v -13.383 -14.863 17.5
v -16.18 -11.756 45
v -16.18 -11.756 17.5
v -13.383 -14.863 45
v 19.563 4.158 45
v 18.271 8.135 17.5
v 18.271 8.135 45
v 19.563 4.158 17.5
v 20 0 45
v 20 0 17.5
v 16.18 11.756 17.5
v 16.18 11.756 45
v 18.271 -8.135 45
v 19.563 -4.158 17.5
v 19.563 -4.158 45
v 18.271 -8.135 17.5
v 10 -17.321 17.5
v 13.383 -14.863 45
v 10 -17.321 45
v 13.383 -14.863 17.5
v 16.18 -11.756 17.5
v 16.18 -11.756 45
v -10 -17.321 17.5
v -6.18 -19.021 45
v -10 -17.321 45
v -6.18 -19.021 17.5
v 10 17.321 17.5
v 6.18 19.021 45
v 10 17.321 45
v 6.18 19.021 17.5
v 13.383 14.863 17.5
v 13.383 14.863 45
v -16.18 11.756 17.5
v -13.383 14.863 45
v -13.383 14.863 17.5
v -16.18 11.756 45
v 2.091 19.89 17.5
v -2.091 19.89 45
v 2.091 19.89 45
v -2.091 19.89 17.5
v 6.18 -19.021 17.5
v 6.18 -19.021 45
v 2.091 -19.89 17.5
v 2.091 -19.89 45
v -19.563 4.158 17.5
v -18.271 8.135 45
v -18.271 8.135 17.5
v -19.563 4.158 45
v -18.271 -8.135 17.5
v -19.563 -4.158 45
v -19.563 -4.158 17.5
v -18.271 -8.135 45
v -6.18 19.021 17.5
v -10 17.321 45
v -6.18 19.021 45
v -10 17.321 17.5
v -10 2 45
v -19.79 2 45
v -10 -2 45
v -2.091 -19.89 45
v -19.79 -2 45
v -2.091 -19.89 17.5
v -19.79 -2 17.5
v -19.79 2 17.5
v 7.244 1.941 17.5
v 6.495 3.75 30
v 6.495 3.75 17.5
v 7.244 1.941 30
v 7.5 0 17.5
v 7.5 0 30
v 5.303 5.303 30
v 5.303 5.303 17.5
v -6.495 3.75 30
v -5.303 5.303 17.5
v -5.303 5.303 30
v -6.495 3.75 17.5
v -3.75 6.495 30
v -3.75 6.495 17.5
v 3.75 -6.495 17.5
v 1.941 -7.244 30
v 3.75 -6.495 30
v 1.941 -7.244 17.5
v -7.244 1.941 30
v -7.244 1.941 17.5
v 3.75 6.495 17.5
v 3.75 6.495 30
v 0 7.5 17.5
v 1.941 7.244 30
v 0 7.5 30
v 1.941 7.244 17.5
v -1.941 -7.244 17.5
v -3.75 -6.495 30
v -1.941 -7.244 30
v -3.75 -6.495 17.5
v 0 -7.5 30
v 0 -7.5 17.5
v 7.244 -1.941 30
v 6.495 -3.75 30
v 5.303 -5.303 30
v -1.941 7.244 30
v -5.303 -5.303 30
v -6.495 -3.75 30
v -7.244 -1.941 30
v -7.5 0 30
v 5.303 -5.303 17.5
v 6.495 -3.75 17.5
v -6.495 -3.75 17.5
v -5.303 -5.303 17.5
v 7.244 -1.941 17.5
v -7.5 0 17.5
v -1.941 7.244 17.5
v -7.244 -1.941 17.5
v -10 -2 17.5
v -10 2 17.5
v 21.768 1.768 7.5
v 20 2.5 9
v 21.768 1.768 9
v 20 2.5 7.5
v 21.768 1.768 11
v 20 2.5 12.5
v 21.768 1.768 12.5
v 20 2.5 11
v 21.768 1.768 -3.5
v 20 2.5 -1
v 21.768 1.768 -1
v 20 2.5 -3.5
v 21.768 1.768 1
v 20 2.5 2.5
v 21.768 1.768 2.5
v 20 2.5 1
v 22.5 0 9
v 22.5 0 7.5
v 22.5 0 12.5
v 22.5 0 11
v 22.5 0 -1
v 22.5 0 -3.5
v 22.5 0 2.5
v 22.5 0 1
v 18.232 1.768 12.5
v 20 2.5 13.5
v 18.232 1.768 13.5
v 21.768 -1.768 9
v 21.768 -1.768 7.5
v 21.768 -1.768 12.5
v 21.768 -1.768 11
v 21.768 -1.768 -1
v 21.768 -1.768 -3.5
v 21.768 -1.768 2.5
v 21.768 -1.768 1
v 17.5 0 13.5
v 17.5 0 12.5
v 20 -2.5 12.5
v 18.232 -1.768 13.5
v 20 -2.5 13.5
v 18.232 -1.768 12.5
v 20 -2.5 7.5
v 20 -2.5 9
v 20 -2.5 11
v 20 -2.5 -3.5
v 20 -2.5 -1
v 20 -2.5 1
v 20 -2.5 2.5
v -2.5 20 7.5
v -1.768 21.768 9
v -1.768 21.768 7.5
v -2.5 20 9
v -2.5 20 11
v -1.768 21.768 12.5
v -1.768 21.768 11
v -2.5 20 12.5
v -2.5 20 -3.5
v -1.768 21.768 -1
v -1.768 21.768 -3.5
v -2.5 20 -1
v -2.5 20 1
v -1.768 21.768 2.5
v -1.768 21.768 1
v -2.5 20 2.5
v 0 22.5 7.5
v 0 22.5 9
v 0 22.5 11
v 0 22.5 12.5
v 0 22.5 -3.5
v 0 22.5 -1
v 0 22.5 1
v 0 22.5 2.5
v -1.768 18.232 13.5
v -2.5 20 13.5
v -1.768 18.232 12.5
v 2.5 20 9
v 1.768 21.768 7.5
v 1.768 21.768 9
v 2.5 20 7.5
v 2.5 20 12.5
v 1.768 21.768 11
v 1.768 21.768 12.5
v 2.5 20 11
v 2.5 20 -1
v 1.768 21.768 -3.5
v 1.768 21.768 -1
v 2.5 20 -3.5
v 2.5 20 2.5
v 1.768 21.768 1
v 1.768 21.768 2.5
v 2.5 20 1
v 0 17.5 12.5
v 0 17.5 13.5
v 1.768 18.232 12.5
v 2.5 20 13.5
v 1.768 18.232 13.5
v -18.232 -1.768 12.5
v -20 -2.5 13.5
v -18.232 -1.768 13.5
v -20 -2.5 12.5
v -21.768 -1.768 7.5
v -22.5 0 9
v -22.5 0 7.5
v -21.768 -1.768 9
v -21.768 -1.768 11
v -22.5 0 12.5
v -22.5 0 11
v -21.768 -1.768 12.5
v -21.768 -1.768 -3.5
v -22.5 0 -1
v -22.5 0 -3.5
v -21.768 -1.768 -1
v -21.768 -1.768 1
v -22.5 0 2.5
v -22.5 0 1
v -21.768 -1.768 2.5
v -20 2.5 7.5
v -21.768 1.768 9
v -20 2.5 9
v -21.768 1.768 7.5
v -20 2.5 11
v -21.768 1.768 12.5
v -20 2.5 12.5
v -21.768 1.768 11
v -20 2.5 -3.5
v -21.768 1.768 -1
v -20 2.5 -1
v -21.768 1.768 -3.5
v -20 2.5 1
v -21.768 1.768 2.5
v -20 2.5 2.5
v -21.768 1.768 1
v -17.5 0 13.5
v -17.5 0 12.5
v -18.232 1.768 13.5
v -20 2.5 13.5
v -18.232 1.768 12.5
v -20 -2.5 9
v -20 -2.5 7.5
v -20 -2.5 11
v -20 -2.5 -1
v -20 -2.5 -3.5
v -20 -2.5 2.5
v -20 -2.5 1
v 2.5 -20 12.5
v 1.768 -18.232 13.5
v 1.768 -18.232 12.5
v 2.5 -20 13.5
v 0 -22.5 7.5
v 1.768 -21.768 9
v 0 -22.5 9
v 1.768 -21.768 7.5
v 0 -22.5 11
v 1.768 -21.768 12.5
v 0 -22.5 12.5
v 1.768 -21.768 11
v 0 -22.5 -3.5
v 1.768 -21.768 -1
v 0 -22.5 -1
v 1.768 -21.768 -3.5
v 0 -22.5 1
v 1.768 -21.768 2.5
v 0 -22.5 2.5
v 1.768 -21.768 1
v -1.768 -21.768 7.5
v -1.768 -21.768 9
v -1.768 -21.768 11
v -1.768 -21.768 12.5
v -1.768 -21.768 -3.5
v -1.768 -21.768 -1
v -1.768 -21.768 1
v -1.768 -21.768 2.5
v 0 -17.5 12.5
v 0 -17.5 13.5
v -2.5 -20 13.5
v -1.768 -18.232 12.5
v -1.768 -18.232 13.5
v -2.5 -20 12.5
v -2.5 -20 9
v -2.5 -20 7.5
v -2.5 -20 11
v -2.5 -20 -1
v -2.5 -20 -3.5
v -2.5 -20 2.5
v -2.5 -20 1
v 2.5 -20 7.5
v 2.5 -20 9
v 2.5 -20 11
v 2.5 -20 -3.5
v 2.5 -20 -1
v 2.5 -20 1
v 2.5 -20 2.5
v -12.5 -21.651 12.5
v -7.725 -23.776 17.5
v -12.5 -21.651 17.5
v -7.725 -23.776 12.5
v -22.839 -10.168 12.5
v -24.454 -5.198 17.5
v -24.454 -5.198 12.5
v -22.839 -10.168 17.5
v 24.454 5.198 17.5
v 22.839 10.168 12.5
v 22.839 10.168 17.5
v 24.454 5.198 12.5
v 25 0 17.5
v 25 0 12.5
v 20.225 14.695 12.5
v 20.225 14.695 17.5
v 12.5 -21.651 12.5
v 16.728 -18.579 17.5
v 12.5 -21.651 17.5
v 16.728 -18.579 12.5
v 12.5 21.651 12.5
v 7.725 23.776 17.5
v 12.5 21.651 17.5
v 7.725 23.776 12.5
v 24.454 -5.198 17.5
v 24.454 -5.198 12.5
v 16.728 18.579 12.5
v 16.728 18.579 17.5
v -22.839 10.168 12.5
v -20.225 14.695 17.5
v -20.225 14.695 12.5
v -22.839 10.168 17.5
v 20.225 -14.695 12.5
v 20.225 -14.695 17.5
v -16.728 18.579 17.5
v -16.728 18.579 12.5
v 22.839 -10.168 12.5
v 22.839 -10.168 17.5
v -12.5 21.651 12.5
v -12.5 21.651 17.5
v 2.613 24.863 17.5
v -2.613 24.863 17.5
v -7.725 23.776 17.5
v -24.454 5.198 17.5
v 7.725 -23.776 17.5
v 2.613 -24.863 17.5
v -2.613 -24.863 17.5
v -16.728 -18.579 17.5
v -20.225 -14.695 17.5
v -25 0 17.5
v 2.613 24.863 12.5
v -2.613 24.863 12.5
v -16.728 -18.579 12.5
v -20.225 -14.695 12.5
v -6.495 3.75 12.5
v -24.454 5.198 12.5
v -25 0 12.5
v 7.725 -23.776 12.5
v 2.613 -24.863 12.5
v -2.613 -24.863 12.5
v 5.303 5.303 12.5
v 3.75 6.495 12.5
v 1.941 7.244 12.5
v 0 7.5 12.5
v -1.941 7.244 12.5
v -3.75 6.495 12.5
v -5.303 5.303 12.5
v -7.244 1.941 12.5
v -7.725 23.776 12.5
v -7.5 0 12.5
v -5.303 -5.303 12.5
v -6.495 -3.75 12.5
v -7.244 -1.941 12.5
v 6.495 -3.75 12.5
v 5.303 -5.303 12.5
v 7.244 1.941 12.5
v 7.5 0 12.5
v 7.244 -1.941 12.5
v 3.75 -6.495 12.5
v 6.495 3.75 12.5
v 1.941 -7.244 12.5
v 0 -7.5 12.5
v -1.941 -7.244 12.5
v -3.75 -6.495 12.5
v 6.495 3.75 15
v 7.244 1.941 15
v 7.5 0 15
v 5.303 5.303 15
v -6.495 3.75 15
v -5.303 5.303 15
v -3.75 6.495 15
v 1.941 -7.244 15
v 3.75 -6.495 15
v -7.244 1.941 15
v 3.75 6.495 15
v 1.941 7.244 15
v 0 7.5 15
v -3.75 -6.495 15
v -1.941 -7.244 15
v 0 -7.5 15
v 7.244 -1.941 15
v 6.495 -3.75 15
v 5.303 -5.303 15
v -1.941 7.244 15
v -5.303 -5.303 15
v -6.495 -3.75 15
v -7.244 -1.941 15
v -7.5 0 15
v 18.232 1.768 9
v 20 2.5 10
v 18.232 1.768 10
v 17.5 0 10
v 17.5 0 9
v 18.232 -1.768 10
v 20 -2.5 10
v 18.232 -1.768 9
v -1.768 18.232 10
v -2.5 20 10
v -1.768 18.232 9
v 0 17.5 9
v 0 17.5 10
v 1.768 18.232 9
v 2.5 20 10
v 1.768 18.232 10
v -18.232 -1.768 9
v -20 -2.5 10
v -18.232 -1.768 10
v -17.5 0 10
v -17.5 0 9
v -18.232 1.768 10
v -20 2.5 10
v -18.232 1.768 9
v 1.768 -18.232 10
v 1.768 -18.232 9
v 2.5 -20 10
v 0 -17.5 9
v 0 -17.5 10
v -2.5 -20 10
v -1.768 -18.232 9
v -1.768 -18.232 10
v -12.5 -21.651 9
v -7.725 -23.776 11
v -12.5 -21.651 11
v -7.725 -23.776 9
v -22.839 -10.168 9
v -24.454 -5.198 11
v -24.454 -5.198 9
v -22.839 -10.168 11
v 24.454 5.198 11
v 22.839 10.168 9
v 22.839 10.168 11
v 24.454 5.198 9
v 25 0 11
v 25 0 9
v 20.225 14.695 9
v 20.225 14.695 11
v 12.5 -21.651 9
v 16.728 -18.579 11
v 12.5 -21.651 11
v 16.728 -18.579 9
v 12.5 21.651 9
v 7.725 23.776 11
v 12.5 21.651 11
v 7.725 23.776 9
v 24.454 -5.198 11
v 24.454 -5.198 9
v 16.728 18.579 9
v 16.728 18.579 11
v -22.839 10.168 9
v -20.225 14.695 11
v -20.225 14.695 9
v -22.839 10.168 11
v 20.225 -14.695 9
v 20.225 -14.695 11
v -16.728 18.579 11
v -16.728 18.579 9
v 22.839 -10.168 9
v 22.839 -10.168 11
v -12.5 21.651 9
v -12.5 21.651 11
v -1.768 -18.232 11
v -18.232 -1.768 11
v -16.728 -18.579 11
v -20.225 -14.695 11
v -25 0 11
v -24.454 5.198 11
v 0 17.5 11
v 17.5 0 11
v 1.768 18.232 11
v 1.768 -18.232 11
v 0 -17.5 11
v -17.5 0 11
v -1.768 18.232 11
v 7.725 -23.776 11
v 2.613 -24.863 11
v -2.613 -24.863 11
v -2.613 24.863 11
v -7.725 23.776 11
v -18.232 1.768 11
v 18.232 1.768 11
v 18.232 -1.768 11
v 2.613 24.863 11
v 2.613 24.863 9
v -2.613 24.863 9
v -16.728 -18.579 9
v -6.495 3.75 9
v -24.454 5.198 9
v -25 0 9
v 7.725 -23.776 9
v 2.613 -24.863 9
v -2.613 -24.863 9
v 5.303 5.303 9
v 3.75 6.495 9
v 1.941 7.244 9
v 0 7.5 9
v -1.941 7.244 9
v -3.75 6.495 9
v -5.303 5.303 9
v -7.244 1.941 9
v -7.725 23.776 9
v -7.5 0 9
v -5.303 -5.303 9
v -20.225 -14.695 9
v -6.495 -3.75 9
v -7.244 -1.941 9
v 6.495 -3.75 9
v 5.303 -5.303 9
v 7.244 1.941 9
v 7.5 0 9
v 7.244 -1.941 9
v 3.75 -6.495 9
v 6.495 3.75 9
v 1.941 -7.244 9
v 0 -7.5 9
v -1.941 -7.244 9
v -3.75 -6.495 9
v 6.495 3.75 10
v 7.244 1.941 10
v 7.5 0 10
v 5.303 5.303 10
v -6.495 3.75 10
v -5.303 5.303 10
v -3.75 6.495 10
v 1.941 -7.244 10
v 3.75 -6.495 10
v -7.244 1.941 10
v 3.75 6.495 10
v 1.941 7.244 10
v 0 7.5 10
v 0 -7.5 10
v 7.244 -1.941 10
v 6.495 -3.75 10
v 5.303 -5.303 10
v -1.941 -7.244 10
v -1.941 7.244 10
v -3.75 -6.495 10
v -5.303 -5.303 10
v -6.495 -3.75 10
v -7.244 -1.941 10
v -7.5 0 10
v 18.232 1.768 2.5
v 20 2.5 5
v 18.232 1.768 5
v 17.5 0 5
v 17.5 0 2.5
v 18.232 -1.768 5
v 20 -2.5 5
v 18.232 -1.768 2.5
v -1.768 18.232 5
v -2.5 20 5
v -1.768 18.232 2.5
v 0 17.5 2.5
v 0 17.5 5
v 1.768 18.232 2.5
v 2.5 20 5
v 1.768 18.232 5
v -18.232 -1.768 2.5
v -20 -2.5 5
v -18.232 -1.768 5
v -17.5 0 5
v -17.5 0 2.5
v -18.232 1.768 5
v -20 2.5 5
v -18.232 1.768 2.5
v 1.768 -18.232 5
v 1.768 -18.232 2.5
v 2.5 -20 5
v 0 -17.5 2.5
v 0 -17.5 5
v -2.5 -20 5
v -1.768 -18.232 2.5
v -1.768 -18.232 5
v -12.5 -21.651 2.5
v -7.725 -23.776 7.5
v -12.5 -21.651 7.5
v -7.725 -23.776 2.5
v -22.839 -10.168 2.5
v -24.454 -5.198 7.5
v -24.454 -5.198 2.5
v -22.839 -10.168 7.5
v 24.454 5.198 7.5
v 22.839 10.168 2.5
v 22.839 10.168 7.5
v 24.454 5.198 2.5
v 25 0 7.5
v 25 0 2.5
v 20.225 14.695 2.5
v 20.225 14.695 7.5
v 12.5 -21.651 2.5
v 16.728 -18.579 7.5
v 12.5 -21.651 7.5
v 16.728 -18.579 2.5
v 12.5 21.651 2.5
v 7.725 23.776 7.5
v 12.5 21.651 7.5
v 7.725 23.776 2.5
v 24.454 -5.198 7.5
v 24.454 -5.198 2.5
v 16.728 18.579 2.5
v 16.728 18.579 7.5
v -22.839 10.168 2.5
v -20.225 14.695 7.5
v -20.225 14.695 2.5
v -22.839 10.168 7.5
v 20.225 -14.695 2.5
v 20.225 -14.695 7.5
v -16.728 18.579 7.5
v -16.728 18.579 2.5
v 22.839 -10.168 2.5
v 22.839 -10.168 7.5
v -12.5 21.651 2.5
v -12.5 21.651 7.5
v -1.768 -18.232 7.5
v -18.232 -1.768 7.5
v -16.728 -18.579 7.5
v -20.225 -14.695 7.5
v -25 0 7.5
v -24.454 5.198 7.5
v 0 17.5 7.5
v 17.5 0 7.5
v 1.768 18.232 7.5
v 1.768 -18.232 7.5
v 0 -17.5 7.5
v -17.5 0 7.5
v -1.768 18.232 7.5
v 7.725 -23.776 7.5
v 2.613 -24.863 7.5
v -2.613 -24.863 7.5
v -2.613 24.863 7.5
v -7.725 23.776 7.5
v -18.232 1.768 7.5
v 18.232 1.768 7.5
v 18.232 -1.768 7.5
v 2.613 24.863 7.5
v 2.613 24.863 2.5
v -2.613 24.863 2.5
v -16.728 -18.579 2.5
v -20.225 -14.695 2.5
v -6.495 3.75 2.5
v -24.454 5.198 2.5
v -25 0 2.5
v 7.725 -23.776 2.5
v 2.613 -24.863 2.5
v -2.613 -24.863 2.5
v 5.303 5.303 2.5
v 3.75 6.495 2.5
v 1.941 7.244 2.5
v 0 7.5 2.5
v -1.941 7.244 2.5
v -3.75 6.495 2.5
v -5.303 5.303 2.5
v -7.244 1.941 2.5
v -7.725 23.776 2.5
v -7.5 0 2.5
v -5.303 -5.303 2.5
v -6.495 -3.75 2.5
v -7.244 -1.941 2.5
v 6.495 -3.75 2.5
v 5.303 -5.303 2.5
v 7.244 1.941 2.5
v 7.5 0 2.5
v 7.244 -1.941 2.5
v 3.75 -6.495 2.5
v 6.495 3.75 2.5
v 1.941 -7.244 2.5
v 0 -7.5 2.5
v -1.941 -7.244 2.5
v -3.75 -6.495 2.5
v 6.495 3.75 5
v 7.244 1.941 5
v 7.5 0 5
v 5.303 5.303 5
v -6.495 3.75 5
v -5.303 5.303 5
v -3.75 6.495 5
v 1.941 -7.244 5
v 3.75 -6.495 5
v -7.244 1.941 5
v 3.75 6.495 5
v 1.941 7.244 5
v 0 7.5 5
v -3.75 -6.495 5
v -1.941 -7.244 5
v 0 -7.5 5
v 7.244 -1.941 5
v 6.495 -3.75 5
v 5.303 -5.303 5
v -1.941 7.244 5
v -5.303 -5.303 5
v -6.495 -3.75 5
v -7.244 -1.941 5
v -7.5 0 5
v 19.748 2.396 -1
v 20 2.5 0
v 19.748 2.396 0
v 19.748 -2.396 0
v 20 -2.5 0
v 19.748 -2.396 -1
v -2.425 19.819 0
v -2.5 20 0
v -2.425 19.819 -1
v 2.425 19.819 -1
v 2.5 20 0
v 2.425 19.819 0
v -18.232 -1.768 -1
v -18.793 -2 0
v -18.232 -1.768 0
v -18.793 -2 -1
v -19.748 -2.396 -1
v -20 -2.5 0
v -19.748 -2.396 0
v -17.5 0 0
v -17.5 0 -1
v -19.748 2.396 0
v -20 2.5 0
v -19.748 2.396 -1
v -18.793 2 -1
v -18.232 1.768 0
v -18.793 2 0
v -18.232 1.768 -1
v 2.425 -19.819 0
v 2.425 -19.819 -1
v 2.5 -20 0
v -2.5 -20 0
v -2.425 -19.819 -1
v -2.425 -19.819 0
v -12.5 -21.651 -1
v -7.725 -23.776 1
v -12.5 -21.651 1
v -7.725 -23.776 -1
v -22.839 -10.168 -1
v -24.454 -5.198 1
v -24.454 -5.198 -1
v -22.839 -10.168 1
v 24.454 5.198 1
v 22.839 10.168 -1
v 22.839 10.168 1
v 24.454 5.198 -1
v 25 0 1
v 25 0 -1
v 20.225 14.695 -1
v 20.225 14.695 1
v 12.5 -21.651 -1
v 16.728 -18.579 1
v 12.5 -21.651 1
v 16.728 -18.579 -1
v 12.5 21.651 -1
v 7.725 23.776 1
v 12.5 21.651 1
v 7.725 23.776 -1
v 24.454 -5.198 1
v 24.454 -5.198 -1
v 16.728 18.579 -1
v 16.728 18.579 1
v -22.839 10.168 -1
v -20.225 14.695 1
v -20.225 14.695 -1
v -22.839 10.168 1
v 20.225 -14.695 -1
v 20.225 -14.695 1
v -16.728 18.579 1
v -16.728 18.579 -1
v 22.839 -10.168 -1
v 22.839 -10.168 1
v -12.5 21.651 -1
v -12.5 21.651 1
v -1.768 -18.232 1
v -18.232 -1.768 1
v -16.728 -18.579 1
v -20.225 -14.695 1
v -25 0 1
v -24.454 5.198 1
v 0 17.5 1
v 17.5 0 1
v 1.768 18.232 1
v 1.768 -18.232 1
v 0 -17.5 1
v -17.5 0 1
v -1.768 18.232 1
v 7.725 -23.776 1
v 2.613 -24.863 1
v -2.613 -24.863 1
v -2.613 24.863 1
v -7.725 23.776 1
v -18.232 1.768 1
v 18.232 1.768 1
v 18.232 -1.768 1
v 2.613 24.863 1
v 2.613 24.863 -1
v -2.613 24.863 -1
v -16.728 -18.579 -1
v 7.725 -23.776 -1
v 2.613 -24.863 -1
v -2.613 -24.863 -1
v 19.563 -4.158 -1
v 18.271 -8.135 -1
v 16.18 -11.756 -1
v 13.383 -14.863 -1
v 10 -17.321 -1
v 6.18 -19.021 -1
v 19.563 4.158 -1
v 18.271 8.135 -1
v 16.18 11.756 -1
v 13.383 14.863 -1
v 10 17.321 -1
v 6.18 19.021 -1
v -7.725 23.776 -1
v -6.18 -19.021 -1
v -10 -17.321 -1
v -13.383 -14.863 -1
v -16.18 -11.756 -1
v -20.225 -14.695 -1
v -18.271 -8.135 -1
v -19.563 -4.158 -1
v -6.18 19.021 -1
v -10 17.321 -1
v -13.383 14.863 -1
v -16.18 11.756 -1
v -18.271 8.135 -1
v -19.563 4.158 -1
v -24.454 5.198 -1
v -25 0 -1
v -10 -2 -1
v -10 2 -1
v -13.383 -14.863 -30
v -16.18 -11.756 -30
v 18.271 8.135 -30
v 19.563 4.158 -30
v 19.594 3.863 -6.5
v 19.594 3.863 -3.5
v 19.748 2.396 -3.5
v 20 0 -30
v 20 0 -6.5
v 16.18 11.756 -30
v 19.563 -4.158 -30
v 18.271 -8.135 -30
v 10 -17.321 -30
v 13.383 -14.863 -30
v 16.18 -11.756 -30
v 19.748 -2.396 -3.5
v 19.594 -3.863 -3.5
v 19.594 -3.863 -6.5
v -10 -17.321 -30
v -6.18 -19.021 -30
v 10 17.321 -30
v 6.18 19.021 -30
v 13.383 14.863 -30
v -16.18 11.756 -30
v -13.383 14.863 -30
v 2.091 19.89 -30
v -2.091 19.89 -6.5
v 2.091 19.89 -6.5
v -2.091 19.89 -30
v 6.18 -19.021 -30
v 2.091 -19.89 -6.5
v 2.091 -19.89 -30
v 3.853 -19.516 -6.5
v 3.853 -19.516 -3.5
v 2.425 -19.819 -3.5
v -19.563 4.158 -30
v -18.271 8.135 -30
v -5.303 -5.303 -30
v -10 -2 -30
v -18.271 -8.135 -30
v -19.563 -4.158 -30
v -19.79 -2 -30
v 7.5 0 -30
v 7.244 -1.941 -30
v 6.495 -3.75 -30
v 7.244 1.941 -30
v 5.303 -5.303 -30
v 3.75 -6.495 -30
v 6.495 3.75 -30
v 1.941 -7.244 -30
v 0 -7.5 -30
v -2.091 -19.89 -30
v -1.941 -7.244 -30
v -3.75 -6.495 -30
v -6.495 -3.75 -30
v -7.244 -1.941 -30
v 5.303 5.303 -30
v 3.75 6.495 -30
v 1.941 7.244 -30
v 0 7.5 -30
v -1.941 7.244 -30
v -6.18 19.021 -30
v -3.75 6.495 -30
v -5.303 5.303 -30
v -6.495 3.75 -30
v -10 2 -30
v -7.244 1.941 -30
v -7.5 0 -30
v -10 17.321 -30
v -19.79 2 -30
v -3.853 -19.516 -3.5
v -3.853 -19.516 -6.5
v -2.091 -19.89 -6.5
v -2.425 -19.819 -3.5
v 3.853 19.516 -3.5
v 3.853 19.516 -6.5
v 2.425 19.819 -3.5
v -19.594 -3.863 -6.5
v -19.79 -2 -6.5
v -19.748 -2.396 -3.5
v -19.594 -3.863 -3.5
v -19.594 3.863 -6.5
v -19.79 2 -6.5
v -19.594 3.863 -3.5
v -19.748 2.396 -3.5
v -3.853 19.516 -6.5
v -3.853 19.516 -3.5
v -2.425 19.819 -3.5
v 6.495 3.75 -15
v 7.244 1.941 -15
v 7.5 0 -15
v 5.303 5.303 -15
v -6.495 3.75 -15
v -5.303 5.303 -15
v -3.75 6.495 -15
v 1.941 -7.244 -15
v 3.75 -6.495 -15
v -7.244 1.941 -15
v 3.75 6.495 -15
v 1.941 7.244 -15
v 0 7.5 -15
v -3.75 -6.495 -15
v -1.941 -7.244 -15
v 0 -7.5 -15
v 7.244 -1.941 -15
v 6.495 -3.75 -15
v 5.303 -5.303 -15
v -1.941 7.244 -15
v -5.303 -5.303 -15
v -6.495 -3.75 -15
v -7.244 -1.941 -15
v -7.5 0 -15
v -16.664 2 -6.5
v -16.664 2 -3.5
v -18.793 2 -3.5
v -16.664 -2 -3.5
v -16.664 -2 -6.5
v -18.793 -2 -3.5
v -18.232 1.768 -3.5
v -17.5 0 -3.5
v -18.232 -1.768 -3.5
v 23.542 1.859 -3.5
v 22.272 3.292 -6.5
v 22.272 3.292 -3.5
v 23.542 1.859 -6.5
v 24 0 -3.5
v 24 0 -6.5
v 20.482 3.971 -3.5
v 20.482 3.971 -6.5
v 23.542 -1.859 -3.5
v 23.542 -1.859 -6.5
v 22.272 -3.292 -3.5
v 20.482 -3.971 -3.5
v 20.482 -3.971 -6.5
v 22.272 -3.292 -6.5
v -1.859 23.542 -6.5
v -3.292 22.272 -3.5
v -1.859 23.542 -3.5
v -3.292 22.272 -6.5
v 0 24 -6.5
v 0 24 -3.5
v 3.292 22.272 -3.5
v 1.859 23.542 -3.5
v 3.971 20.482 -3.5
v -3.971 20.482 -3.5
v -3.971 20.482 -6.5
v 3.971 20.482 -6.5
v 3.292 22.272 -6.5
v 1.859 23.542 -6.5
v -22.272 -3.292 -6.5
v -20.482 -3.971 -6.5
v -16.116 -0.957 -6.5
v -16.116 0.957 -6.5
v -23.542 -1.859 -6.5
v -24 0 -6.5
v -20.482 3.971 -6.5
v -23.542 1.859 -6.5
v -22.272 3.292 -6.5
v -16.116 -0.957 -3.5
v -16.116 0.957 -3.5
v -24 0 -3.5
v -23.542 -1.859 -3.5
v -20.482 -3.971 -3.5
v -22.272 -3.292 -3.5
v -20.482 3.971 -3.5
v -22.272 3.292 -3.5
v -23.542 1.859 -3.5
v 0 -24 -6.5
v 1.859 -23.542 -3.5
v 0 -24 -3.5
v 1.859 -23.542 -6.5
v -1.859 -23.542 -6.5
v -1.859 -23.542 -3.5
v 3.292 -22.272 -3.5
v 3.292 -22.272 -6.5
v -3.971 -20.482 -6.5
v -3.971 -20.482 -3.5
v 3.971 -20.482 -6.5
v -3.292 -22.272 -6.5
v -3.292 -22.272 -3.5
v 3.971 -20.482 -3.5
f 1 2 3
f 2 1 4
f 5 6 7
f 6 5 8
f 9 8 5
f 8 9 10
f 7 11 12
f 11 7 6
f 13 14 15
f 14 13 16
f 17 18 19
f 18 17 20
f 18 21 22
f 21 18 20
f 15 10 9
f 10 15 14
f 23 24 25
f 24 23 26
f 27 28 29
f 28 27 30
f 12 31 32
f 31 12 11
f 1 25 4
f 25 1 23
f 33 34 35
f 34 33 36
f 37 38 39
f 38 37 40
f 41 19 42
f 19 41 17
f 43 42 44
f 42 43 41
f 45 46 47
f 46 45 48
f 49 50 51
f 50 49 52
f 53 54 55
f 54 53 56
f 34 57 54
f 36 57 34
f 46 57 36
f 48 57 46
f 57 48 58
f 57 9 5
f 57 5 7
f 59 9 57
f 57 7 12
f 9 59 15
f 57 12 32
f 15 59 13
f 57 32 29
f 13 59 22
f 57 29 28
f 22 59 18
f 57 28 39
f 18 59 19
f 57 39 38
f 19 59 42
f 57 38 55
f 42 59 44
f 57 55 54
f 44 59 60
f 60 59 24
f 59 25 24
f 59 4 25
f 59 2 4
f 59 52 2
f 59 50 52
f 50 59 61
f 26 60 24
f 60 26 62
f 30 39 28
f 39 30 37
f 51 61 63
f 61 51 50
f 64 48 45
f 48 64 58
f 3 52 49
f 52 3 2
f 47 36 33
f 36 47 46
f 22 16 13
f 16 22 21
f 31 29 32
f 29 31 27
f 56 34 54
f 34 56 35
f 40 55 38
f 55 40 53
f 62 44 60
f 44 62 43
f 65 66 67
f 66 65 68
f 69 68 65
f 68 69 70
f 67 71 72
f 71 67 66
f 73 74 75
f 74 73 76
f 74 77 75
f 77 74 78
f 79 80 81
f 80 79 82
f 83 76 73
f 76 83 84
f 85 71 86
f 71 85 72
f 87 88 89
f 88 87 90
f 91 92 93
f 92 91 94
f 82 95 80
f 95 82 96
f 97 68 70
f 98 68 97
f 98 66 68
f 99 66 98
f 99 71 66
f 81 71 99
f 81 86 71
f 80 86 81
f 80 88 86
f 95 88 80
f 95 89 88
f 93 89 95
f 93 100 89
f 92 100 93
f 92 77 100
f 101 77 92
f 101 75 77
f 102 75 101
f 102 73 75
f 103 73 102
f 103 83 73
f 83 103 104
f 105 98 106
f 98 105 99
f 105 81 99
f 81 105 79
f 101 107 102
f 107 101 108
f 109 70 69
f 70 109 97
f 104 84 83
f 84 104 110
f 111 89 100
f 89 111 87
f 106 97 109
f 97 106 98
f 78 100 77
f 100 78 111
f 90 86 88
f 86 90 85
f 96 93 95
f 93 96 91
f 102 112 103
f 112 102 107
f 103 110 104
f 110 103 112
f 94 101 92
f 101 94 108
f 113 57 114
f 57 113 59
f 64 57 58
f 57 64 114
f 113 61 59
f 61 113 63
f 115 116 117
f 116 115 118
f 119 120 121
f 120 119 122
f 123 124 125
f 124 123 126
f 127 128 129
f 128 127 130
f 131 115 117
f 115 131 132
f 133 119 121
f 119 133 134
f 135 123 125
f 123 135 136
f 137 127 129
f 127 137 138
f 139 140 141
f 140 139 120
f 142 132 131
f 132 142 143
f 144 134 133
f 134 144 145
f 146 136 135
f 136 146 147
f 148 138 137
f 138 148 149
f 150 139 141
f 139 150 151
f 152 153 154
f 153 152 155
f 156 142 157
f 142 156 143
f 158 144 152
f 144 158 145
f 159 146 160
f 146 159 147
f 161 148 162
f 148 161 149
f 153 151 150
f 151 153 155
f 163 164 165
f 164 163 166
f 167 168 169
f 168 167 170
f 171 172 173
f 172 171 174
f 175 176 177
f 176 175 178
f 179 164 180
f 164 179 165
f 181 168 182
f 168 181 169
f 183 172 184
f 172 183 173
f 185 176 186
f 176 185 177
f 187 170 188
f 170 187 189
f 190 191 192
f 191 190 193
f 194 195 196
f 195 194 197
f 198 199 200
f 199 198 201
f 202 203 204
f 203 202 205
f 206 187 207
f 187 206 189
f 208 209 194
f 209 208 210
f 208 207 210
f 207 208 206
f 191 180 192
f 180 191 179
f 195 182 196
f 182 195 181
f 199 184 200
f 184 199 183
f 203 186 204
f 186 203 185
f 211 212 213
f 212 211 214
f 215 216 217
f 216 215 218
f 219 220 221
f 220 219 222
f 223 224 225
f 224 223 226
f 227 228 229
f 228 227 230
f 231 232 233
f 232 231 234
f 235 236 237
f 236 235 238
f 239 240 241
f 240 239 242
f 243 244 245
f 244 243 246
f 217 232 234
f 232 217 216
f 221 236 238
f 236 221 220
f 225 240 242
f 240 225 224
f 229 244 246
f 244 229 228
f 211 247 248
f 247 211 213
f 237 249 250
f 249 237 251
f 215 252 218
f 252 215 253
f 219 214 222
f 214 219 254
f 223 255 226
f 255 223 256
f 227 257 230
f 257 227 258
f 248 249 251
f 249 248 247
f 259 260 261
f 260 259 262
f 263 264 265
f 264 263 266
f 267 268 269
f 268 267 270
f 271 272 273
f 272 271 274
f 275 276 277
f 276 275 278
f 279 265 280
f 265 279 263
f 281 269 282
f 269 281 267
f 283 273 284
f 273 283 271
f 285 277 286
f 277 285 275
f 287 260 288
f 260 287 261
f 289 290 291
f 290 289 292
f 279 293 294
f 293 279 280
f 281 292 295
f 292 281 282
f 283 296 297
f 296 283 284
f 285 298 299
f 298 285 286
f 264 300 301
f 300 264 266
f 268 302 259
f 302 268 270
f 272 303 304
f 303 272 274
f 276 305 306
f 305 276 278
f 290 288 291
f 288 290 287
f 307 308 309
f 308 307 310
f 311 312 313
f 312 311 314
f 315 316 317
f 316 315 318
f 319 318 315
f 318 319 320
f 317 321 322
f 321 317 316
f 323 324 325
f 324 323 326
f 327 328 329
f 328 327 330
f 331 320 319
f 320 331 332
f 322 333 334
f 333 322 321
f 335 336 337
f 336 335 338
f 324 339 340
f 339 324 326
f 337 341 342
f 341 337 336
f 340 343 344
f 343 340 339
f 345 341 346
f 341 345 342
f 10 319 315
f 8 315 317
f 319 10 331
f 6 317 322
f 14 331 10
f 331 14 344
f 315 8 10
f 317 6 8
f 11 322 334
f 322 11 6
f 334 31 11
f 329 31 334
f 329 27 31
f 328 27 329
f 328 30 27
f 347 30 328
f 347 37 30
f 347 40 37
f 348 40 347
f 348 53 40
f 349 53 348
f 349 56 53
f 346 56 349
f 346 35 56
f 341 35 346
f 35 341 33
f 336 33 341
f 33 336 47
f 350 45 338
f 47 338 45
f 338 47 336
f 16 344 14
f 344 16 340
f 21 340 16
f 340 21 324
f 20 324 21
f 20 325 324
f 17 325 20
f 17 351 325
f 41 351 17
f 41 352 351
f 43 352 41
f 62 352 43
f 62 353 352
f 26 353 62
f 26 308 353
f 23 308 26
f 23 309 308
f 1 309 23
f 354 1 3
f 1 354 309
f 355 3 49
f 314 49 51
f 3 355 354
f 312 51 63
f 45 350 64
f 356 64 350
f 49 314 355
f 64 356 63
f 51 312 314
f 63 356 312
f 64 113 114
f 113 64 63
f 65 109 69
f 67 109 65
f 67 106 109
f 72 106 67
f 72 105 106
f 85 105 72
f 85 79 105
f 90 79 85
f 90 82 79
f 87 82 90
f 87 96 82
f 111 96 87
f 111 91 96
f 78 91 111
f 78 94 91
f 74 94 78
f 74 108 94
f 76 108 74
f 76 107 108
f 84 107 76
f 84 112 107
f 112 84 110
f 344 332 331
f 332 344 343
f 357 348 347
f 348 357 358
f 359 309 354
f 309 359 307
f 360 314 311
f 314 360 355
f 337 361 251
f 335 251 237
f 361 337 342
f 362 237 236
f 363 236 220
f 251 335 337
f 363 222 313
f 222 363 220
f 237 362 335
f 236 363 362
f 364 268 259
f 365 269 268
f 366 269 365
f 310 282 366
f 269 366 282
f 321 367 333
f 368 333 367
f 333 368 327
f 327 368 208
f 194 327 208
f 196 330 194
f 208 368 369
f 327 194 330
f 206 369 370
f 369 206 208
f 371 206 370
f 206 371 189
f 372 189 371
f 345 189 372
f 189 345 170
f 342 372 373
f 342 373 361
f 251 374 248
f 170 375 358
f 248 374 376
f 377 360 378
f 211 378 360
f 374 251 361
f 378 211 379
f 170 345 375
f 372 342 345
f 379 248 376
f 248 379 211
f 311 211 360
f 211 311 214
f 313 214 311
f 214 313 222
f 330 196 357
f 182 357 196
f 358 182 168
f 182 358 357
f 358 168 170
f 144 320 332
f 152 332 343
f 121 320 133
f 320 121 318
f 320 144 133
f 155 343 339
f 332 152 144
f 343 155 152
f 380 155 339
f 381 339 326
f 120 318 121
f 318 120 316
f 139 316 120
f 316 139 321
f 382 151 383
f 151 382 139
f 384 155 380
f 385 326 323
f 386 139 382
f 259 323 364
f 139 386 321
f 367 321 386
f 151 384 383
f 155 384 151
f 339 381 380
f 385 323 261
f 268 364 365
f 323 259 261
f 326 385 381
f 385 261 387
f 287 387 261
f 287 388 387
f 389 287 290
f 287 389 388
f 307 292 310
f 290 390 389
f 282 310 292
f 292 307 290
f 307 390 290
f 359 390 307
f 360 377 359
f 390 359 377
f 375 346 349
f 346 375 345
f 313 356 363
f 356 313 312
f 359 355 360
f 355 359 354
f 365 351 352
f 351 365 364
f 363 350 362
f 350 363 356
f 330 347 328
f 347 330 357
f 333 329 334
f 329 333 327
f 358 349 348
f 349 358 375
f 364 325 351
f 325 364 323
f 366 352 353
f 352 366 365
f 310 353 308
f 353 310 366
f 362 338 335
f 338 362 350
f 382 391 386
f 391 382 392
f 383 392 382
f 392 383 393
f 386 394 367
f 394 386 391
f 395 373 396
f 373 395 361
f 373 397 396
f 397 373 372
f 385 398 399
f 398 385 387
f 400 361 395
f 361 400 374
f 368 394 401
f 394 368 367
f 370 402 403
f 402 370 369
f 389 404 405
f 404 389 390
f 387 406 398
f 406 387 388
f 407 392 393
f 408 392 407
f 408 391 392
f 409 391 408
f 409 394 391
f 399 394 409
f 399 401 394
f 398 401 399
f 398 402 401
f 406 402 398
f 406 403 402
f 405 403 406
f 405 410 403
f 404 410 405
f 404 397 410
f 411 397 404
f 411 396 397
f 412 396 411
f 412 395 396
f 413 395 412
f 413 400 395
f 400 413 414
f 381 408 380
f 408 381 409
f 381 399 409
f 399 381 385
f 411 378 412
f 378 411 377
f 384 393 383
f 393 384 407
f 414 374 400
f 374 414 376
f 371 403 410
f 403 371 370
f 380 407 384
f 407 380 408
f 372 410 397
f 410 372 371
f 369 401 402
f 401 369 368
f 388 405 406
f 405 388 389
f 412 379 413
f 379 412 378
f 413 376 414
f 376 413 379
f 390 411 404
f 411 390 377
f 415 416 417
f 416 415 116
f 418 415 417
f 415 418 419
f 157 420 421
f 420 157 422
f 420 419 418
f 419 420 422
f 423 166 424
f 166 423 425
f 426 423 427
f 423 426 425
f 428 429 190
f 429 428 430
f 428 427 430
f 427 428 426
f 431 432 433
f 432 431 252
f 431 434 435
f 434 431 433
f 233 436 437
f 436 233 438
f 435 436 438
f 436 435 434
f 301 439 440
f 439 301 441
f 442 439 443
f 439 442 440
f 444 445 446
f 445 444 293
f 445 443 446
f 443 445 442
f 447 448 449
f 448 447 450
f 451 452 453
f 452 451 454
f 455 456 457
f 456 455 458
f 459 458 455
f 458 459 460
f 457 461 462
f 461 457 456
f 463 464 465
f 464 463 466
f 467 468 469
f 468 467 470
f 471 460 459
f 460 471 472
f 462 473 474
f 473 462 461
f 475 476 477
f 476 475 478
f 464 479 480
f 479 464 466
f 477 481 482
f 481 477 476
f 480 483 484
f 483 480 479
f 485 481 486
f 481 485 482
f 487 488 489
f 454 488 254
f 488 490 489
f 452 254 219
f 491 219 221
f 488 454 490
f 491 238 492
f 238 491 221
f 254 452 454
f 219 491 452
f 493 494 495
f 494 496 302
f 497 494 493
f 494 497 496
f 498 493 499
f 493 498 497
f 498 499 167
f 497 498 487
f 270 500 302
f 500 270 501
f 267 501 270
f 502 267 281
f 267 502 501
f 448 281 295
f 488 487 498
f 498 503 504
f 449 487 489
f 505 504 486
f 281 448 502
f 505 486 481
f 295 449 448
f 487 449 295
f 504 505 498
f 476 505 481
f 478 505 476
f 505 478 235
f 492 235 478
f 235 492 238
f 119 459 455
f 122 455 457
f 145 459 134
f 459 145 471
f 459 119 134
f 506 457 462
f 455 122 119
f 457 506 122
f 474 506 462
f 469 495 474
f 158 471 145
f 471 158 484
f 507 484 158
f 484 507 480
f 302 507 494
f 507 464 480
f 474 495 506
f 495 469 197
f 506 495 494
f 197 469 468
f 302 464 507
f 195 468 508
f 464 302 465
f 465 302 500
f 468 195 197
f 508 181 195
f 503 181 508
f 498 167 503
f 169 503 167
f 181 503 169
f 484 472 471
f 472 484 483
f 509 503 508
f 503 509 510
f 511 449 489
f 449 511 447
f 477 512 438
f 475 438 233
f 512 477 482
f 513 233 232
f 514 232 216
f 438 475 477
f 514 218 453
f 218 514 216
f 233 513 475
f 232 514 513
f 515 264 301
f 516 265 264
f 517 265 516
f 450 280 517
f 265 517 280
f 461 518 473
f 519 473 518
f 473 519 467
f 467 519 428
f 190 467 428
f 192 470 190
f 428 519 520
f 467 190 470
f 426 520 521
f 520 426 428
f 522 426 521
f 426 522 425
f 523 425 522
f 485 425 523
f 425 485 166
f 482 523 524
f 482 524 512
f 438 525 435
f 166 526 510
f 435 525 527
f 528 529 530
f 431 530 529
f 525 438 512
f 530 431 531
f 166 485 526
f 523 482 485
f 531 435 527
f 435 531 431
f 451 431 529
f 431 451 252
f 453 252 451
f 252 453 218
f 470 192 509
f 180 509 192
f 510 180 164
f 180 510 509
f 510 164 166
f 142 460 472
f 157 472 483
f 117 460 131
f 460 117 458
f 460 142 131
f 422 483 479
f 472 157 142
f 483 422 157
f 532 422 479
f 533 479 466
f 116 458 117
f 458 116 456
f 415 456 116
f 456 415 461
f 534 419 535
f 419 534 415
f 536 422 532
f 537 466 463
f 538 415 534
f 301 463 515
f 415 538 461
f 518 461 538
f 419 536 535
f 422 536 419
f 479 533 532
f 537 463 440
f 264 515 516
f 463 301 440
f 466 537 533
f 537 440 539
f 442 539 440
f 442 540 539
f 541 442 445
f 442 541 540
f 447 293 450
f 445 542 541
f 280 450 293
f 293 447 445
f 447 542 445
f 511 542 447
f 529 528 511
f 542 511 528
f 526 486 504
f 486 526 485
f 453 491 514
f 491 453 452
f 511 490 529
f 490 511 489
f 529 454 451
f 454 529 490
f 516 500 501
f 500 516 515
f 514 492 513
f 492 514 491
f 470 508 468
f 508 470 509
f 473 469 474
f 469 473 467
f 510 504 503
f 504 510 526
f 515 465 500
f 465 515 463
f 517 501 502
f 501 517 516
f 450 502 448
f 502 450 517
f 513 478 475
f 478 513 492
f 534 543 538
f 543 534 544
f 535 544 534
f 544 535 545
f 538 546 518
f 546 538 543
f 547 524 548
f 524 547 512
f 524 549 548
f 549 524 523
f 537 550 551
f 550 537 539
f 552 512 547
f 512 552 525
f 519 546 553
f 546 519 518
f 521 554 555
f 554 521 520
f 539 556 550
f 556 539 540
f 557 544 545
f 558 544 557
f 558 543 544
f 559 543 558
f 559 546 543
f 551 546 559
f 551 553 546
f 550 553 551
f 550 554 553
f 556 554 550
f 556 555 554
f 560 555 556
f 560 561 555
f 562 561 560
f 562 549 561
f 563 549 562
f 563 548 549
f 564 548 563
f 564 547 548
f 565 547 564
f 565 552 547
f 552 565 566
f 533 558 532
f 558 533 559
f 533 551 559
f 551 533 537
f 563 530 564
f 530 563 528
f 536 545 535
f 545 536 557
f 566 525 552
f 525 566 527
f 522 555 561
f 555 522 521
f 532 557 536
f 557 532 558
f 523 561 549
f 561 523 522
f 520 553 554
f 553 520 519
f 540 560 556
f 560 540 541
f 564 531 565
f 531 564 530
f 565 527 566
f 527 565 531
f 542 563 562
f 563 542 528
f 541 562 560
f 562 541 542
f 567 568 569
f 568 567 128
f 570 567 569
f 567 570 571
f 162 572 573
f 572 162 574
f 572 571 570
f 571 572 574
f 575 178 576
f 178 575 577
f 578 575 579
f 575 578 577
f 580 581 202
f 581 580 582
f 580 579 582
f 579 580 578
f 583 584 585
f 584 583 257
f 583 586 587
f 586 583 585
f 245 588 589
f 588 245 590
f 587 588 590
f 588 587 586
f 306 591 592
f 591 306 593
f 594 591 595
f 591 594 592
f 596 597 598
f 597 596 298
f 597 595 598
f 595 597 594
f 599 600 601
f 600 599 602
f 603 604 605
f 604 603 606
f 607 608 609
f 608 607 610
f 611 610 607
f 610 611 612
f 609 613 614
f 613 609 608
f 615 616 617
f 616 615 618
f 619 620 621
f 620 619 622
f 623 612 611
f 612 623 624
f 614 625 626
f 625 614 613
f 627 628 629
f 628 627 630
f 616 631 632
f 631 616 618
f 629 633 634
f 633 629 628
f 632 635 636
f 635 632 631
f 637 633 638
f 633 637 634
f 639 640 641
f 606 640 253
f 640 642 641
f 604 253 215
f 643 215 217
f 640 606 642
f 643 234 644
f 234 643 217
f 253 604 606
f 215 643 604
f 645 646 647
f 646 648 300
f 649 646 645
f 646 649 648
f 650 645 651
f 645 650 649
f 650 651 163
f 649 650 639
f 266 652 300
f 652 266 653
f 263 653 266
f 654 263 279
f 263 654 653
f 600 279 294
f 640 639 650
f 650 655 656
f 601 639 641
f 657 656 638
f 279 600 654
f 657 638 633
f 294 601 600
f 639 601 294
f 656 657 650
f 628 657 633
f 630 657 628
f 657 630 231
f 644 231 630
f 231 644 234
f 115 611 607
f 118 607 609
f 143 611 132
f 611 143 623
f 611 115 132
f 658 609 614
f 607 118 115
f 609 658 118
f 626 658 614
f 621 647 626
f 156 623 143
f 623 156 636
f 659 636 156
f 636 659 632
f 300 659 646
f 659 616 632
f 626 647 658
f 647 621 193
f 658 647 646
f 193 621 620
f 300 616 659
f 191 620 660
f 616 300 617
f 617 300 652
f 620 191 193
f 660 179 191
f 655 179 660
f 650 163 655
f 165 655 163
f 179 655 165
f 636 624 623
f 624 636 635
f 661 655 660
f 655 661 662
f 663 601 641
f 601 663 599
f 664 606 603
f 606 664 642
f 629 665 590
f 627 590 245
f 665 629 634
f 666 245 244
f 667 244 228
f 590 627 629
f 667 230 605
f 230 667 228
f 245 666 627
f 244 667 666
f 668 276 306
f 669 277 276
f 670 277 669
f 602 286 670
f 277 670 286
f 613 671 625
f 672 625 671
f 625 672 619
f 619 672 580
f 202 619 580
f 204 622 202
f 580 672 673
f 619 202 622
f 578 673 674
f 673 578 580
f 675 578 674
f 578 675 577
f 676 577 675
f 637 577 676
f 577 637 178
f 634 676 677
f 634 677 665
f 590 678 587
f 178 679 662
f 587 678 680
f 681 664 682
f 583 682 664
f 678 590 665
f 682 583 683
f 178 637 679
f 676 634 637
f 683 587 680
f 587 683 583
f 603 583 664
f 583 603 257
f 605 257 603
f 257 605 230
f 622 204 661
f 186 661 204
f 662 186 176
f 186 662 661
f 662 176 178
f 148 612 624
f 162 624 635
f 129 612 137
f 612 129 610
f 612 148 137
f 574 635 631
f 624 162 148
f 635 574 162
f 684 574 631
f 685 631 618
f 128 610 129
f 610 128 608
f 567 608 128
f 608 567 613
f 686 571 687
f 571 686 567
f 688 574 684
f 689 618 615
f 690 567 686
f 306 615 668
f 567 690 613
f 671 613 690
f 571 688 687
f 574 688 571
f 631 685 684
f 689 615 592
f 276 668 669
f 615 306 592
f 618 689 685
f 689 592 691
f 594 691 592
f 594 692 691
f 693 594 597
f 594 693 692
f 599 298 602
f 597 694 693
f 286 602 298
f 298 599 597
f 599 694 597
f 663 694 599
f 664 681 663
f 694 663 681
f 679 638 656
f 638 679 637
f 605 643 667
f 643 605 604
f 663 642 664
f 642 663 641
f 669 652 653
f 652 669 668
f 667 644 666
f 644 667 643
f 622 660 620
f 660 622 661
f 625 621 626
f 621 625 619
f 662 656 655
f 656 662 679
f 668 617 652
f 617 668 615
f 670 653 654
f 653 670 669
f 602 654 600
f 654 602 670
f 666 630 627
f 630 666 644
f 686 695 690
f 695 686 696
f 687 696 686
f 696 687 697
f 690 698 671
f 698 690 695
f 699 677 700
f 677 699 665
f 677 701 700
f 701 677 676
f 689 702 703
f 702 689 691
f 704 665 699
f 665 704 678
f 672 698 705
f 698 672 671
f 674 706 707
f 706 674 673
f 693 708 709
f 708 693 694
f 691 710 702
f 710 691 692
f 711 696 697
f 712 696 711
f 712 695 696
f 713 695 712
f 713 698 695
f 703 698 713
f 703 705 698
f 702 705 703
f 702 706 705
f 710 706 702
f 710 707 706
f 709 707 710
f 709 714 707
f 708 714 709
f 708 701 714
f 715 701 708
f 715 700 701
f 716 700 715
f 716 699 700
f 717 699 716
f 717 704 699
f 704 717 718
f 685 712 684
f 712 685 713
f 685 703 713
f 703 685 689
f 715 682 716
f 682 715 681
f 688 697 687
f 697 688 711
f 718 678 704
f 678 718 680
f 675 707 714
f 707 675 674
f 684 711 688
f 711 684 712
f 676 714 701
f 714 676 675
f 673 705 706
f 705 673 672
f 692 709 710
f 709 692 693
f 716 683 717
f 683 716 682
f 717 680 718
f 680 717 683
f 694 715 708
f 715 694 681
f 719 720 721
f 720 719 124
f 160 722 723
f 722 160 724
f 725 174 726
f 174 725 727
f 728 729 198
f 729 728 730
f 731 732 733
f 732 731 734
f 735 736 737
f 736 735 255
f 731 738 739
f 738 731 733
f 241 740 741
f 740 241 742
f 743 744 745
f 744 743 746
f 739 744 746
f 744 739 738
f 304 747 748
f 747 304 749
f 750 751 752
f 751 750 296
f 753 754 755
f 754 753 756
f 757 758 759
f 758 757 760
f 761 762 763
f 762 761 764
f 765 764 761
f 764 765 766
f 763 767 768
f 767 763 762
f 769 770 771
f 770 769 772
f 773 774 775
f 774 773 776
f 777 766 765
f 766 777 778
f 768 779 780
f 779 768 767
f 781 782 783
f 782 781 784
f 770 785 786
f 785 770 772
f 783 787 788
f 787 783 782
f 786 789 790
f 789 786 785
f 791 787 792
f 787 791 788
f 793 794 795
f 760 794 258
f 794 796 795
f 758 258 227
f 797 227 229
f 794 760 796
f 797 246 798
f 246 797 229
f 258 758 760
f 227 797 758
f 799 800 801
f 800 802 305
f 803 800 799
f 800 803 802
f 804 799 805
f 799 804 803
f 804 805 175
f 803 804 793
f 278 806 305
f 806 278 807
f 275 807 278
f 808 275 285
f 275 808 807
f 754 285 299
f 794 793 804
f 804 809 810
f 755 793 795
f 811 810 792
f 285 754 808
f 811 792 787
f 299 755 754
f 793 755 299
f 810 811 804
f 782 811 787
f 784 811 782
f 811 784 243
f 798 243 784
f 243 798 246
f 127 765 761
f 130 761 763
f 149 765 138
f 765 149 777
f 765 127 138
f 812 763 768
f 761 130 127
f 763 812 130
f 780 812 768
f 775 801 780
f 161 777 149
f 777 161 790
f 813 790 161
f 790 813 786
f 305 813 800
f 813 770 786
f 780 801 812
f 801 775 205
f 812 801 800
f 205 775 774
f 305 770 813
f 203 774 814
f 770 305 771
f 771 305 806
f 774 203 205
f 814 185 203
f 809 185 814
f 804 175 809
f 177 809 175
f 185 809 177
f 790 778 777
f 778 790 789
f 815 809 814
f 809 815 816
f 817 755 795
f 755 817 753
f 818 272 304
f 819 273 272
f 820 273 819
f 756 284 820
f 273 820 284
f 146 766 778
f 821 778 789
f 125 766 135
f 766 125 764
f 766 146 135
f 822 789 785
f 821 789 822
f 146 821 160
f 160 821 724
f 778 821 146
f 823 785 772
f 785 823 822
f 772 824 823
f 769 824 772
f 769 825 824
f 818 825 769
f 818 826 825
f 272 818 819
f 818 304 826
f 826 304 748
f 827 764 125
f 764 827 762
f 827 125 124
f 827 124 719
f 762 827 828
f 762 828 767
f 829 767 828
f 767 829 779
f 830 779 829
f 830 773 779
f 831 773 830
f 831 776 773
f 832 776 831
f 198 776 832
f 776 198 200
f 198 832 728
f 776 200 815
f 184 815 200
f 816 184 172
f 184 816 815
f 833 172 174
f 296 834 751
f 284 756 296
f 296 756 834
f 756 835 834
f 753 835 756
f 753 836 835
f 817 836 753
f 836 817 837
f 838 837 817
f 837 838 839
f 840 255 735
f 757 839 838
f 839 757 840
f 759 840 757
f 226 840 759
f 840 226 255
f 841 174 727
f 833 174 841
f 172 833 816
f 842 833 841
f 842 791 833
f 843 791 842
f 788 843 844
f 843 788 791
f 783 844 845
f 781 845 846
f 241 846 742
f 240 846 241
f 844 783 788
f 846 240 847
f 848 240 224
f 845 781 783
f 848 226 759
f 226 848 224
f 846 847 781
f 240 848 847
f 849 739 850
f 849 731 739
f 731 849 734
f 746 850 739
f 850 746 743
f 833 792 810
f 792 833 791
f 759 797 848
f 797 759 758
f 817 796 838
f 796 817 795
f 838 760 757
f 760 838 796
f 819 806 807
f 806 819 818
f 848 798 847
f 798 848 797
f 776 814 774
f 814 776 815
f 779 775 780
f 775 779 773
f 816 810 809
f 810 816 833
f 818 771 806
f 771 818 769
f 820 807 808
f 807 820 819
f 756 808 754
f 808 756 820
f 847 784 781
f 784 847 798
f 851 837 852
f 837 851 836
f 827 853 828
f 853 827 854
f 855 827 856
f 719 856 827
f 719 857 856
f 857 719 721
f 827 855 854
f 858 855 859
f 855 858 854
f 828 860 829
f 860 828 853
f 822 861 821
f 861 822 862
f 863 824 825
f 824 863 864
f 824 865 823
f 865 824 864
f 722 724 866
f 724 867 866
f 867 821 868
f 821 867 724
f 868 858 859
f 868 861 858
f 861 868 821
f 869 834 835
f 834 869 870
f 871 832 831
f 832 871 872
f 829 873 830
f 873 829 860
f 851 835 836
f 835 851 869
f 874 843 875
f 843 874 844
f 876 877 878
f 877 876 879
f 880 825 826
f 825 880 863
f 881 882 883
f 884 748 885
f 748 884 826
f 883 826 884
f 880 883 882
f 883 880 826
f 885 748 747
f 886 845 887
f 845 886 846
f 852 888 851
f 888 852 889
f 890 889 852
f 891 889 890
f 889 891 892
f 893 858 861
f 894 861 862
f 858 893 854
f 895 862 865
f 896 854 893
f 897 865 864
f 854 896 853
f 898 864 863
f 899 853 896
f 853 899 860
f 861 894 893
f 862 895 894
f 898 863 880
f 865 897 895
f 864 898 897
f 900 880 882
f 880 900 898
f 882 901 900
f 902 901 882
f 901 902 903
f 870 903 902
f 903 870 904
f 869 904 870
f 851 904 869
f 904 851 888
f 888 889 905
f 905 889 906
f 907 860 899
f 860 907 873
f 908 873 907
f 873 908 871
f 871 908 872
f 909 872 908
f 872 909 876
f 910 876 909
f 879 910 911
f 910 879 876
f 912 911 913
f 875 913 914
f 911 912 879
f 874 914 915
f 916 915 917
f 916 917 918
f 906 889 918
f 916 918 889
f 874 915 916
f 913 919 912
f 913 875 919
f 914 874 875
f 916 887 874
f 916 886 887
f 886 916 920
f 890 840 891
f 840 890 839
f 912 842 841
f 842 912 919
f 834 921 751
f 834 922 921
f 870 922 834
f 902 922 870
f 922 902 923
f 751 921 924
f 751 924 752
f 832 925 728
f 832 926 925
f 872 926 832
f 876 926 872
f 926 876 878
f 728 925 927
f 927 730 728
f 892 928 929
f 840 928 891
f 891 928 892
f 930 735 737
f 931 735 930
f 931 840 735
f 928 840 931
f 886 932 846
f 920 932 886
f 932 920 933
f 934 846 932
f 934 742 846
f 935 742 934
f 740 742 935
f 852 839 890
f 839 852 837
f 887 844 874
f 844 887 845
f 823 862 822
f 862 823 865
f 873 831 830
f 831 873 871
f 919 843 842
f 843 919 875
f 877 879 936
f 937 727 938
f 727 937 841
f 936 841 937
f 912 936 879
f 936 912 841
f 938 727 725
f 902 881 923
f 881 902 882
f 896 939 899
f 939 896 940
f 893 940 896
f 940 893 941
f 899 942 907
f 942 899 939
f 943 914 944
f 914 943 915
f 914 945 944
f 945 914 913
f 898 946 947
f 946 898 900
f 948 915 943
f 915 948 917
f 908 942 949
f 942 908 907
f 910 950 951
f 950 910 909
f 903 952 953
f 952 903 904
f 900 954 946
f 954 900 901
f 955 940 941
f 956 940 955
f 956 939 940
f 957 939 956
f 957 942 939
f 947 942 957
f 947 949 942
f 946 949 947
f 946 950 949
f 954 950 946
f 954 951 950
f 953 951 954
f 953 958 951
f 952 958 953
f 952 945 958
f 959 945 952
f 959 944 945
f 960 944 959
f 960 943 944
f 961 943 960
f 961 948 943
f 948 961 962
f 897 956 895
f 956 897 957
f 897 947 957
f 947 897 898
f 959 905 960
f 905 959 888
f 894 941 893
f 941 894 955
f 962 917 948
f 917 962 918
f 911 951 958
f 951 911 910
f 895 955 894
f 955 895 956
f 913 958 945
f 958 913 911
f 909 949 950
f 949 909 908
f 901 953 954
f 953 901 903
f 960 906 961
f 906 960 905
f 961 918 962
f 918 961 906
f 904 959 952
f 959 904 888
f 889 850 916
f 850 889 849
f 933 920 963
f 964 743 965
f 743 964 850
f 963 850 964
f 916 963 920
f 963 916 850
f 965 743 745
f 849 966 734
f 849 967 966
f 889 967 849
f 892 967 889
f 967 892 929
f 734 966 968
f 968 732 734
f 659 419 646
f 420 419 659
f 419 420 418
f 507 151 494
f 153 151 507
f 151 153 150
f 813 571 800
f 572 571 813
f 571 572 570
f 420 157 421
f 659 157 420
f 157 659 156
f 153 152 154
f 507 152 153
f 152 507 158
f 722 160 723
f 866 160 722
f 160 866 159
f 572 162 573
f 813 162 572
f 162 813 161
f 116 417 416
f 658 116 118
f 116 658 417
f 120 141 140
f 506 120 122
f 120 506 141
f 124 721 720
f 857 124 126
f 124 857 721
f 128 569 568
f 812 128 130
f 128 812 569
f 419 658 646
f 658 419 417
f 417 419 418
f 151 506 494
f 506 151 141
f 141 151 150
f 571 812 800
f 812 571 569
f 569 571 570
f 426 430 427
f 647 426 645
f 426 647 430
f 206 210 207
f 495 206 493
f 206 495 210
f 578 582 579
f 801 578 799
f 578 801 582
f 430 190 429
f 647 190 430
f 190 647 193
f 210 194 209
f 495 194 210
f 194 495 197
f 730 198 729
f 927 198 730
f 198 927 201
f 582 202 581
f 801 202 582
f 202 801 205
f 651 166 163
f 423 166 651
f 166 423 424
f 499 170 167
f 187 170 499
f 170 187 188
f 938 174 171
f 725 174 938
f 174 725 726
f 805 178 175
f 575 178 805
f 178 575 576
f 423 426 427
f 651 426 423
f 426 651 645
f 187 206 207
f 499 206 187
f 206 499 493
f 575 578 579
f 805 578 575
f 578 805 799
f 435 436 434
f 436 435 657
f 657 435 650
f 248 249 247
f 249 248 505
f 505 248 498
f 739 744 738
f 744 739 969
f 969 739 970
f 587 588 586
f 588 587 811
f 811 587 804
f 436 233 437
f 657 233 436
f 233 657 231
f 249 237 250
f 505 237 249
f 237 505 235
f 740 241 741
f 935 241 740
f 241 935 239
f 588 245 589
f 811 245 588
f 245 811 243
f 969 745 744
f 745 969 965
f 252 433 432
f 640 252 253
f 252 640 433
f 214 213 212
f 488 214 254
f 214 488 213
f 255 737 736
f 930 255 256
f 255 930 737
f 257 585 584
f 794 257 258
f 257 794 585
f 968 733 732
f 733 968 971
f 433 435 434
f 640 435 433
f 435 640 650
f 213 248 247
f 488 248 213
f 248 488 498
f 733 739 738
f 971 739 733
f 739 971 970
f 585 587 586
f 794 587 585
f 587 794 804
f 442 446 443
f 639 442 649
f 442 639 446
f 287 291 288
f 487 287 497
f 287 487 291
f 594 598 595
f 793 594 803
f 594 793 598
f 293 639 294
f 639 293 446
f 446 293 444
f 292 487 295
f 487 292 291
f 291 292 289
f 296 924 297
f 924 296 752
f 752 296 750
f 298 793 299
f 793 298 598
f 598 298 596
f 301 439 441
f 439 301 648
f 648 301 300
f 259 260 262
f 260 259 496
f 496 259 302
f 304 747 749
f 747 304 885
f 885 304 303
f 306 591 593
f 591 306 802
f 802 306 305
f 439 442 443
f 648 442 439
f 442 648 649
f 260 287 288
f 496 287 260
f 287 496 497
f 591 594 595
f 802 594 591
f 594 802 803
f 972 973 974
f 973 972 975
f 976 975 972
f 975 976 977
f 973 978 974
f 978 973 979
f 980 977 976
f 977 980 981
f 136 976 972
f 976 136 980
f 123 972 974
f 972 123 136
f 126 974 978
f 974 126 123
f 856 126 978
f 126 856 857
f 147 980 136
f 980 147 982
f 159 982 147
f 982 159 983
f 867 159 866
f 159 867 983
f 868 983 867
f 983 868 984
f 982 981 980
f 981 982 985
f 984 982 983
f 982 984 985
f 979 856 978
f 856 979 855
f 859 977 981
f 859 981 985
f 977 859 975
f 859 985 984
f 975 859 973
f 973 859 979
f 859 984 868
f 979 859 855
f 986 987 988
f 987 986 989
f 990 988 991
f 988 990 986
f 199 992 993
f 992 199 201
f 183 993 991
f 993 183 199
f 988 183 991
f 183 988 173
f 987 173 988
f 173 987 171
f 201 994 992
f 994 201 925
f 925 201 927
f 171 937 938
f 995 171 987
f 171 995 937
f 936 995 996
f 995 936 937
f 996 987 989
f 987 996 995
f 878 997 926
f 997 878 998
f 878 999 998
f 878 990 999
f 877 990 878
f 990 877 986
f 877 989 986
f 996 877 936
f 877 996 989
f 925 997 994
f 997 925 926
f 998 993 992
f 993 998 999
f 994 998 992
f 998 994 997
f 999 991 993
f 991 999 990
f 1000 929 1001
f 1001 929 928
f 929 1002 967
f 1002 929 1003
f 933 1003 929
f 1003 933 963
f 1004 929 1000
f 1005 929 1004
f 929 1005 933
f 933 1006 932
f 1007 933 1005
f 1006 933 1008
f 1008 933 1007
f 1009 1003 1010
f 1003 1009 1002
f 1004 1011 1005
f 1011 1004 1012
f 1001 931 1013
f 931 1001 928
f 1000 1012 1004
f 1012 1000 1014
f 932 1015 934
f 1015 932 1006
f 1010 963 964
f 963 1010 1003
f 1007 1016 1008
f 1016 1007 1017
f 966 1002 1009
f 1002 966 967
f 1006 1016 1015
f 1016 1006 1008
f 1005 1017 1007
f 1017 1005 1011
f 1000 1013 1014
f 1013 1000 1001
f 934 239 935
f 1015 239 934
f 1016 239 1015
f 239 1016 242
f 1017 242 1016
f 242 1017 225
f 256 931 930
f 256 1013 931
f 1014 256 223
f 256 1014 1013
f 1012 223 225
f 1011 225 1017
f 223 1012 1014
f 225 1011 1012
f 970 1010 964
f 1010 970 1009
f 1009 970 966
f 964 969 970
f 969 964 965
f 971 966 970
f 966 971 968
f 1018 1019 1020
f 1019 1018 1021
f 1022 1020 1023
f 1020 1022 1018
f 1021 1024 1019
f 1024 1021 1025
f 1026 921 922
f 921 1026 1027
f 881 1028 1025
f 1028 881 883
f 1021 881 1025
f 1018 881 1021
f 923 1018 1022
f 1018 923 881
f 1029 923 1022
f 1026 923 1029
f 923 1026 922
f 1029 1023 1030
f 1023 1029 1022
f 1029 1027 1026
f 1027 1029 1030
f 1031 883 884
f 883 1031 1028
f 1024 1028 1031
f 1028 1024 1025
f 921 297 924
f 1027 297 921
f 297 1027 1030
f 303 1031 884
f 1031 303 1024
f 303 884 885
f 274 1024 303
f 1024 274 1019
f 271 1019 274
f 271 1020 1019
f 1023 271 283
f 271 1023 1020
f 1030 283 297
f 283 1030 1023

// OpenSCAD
// Module for a cylindrical hub with a keyway slot
module shaft_hub() {
    difference() {
        cylinder(h=30, d=40, center=true);
        translate([0, 0, -15]) cylinder(h=30, d=15, center=true); // Central hole
        translate([-20, -2, -15]) cube([10, 4, 30]); // Keyway slot
    }
}

// Module for a flange plate with bolt holes
module flange_plate() {
    difference() {
        cylinder(h=5, d=50, center=true);
        translate([0, 0, -2.5]) cylinder(h=5, d=15, center=true); // Central hole
        for (i = [0:90:270]) {
            rotate([0, 0, i]) translate([20, 0, -2.5]) cylinder(h=5, d=5, center=true); // Bolt holes
        }
    }
}

// Module for a flexible spacer ring
module flexible_spacer_ring() {
    difference() {
        cylinder(h=2, d=50, center=true);
        translate([0, 0, -1]) cylinder(h=2, d=15, center=true); // Central hole
        for (i = [0:90:270]) {
            rotate([0, 0, i]) translate([20, 0, -1]) cylinder(h=2, d=5, center=true); // Bolt holes
        }
    }
}

// Module for a bolt with a hexagonal head
module bolt() {
    union() {
        cylinder(h=20, d=5, center=true);
        translate([0, 0, 10]) cylinder(h=3, d1=8, d2=5, center=true); // Hexagonal head
    }
}

// Module for a hexagonal nut
module nut() {
    cylinder(h=3, d=8, center=true);
}

// Assemble the coupling
module coupling() {
    translate([0, 0, 30]) shaft_hub(); // Input shaft hub
    translate([0, 0, 15]) flange_plate(); // First flange plate
    translate([0, 0, 10]) flexible_spacer_ring(); // First flexible spacer ring
    translate([0, 0, 5]) flange_plate(); // Second flange plate
    translate([0, 0, 0]) flexible_spacer_ring(); // Second flexible spacer ring
    translate([0, 0, -15]) shaft_hub(); // Output shaft hub

    // Bolts and nuts
    for (i = [0:90:270]) {
        rotate([0, 0, i]) translate([20, 0, 5]) bolt();
        rotate([0, 0, i]) translate([20, 0, -5]) nut();
    }
}

// Render the coupling
coupling();
